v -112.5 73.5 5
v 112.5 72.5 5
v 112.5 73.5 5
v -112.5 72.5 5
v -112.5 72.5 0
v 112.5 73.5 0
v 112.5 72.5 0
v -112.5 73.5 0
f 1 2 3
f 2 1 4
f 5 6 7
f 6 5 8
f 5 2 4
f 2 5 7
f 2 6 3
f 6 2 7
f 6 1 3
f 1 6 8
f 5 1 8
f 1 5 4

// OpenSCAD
// Machine image for Simplify3D display.

translate([-112.5, 72.5]) cube([225, 1, 5]);
